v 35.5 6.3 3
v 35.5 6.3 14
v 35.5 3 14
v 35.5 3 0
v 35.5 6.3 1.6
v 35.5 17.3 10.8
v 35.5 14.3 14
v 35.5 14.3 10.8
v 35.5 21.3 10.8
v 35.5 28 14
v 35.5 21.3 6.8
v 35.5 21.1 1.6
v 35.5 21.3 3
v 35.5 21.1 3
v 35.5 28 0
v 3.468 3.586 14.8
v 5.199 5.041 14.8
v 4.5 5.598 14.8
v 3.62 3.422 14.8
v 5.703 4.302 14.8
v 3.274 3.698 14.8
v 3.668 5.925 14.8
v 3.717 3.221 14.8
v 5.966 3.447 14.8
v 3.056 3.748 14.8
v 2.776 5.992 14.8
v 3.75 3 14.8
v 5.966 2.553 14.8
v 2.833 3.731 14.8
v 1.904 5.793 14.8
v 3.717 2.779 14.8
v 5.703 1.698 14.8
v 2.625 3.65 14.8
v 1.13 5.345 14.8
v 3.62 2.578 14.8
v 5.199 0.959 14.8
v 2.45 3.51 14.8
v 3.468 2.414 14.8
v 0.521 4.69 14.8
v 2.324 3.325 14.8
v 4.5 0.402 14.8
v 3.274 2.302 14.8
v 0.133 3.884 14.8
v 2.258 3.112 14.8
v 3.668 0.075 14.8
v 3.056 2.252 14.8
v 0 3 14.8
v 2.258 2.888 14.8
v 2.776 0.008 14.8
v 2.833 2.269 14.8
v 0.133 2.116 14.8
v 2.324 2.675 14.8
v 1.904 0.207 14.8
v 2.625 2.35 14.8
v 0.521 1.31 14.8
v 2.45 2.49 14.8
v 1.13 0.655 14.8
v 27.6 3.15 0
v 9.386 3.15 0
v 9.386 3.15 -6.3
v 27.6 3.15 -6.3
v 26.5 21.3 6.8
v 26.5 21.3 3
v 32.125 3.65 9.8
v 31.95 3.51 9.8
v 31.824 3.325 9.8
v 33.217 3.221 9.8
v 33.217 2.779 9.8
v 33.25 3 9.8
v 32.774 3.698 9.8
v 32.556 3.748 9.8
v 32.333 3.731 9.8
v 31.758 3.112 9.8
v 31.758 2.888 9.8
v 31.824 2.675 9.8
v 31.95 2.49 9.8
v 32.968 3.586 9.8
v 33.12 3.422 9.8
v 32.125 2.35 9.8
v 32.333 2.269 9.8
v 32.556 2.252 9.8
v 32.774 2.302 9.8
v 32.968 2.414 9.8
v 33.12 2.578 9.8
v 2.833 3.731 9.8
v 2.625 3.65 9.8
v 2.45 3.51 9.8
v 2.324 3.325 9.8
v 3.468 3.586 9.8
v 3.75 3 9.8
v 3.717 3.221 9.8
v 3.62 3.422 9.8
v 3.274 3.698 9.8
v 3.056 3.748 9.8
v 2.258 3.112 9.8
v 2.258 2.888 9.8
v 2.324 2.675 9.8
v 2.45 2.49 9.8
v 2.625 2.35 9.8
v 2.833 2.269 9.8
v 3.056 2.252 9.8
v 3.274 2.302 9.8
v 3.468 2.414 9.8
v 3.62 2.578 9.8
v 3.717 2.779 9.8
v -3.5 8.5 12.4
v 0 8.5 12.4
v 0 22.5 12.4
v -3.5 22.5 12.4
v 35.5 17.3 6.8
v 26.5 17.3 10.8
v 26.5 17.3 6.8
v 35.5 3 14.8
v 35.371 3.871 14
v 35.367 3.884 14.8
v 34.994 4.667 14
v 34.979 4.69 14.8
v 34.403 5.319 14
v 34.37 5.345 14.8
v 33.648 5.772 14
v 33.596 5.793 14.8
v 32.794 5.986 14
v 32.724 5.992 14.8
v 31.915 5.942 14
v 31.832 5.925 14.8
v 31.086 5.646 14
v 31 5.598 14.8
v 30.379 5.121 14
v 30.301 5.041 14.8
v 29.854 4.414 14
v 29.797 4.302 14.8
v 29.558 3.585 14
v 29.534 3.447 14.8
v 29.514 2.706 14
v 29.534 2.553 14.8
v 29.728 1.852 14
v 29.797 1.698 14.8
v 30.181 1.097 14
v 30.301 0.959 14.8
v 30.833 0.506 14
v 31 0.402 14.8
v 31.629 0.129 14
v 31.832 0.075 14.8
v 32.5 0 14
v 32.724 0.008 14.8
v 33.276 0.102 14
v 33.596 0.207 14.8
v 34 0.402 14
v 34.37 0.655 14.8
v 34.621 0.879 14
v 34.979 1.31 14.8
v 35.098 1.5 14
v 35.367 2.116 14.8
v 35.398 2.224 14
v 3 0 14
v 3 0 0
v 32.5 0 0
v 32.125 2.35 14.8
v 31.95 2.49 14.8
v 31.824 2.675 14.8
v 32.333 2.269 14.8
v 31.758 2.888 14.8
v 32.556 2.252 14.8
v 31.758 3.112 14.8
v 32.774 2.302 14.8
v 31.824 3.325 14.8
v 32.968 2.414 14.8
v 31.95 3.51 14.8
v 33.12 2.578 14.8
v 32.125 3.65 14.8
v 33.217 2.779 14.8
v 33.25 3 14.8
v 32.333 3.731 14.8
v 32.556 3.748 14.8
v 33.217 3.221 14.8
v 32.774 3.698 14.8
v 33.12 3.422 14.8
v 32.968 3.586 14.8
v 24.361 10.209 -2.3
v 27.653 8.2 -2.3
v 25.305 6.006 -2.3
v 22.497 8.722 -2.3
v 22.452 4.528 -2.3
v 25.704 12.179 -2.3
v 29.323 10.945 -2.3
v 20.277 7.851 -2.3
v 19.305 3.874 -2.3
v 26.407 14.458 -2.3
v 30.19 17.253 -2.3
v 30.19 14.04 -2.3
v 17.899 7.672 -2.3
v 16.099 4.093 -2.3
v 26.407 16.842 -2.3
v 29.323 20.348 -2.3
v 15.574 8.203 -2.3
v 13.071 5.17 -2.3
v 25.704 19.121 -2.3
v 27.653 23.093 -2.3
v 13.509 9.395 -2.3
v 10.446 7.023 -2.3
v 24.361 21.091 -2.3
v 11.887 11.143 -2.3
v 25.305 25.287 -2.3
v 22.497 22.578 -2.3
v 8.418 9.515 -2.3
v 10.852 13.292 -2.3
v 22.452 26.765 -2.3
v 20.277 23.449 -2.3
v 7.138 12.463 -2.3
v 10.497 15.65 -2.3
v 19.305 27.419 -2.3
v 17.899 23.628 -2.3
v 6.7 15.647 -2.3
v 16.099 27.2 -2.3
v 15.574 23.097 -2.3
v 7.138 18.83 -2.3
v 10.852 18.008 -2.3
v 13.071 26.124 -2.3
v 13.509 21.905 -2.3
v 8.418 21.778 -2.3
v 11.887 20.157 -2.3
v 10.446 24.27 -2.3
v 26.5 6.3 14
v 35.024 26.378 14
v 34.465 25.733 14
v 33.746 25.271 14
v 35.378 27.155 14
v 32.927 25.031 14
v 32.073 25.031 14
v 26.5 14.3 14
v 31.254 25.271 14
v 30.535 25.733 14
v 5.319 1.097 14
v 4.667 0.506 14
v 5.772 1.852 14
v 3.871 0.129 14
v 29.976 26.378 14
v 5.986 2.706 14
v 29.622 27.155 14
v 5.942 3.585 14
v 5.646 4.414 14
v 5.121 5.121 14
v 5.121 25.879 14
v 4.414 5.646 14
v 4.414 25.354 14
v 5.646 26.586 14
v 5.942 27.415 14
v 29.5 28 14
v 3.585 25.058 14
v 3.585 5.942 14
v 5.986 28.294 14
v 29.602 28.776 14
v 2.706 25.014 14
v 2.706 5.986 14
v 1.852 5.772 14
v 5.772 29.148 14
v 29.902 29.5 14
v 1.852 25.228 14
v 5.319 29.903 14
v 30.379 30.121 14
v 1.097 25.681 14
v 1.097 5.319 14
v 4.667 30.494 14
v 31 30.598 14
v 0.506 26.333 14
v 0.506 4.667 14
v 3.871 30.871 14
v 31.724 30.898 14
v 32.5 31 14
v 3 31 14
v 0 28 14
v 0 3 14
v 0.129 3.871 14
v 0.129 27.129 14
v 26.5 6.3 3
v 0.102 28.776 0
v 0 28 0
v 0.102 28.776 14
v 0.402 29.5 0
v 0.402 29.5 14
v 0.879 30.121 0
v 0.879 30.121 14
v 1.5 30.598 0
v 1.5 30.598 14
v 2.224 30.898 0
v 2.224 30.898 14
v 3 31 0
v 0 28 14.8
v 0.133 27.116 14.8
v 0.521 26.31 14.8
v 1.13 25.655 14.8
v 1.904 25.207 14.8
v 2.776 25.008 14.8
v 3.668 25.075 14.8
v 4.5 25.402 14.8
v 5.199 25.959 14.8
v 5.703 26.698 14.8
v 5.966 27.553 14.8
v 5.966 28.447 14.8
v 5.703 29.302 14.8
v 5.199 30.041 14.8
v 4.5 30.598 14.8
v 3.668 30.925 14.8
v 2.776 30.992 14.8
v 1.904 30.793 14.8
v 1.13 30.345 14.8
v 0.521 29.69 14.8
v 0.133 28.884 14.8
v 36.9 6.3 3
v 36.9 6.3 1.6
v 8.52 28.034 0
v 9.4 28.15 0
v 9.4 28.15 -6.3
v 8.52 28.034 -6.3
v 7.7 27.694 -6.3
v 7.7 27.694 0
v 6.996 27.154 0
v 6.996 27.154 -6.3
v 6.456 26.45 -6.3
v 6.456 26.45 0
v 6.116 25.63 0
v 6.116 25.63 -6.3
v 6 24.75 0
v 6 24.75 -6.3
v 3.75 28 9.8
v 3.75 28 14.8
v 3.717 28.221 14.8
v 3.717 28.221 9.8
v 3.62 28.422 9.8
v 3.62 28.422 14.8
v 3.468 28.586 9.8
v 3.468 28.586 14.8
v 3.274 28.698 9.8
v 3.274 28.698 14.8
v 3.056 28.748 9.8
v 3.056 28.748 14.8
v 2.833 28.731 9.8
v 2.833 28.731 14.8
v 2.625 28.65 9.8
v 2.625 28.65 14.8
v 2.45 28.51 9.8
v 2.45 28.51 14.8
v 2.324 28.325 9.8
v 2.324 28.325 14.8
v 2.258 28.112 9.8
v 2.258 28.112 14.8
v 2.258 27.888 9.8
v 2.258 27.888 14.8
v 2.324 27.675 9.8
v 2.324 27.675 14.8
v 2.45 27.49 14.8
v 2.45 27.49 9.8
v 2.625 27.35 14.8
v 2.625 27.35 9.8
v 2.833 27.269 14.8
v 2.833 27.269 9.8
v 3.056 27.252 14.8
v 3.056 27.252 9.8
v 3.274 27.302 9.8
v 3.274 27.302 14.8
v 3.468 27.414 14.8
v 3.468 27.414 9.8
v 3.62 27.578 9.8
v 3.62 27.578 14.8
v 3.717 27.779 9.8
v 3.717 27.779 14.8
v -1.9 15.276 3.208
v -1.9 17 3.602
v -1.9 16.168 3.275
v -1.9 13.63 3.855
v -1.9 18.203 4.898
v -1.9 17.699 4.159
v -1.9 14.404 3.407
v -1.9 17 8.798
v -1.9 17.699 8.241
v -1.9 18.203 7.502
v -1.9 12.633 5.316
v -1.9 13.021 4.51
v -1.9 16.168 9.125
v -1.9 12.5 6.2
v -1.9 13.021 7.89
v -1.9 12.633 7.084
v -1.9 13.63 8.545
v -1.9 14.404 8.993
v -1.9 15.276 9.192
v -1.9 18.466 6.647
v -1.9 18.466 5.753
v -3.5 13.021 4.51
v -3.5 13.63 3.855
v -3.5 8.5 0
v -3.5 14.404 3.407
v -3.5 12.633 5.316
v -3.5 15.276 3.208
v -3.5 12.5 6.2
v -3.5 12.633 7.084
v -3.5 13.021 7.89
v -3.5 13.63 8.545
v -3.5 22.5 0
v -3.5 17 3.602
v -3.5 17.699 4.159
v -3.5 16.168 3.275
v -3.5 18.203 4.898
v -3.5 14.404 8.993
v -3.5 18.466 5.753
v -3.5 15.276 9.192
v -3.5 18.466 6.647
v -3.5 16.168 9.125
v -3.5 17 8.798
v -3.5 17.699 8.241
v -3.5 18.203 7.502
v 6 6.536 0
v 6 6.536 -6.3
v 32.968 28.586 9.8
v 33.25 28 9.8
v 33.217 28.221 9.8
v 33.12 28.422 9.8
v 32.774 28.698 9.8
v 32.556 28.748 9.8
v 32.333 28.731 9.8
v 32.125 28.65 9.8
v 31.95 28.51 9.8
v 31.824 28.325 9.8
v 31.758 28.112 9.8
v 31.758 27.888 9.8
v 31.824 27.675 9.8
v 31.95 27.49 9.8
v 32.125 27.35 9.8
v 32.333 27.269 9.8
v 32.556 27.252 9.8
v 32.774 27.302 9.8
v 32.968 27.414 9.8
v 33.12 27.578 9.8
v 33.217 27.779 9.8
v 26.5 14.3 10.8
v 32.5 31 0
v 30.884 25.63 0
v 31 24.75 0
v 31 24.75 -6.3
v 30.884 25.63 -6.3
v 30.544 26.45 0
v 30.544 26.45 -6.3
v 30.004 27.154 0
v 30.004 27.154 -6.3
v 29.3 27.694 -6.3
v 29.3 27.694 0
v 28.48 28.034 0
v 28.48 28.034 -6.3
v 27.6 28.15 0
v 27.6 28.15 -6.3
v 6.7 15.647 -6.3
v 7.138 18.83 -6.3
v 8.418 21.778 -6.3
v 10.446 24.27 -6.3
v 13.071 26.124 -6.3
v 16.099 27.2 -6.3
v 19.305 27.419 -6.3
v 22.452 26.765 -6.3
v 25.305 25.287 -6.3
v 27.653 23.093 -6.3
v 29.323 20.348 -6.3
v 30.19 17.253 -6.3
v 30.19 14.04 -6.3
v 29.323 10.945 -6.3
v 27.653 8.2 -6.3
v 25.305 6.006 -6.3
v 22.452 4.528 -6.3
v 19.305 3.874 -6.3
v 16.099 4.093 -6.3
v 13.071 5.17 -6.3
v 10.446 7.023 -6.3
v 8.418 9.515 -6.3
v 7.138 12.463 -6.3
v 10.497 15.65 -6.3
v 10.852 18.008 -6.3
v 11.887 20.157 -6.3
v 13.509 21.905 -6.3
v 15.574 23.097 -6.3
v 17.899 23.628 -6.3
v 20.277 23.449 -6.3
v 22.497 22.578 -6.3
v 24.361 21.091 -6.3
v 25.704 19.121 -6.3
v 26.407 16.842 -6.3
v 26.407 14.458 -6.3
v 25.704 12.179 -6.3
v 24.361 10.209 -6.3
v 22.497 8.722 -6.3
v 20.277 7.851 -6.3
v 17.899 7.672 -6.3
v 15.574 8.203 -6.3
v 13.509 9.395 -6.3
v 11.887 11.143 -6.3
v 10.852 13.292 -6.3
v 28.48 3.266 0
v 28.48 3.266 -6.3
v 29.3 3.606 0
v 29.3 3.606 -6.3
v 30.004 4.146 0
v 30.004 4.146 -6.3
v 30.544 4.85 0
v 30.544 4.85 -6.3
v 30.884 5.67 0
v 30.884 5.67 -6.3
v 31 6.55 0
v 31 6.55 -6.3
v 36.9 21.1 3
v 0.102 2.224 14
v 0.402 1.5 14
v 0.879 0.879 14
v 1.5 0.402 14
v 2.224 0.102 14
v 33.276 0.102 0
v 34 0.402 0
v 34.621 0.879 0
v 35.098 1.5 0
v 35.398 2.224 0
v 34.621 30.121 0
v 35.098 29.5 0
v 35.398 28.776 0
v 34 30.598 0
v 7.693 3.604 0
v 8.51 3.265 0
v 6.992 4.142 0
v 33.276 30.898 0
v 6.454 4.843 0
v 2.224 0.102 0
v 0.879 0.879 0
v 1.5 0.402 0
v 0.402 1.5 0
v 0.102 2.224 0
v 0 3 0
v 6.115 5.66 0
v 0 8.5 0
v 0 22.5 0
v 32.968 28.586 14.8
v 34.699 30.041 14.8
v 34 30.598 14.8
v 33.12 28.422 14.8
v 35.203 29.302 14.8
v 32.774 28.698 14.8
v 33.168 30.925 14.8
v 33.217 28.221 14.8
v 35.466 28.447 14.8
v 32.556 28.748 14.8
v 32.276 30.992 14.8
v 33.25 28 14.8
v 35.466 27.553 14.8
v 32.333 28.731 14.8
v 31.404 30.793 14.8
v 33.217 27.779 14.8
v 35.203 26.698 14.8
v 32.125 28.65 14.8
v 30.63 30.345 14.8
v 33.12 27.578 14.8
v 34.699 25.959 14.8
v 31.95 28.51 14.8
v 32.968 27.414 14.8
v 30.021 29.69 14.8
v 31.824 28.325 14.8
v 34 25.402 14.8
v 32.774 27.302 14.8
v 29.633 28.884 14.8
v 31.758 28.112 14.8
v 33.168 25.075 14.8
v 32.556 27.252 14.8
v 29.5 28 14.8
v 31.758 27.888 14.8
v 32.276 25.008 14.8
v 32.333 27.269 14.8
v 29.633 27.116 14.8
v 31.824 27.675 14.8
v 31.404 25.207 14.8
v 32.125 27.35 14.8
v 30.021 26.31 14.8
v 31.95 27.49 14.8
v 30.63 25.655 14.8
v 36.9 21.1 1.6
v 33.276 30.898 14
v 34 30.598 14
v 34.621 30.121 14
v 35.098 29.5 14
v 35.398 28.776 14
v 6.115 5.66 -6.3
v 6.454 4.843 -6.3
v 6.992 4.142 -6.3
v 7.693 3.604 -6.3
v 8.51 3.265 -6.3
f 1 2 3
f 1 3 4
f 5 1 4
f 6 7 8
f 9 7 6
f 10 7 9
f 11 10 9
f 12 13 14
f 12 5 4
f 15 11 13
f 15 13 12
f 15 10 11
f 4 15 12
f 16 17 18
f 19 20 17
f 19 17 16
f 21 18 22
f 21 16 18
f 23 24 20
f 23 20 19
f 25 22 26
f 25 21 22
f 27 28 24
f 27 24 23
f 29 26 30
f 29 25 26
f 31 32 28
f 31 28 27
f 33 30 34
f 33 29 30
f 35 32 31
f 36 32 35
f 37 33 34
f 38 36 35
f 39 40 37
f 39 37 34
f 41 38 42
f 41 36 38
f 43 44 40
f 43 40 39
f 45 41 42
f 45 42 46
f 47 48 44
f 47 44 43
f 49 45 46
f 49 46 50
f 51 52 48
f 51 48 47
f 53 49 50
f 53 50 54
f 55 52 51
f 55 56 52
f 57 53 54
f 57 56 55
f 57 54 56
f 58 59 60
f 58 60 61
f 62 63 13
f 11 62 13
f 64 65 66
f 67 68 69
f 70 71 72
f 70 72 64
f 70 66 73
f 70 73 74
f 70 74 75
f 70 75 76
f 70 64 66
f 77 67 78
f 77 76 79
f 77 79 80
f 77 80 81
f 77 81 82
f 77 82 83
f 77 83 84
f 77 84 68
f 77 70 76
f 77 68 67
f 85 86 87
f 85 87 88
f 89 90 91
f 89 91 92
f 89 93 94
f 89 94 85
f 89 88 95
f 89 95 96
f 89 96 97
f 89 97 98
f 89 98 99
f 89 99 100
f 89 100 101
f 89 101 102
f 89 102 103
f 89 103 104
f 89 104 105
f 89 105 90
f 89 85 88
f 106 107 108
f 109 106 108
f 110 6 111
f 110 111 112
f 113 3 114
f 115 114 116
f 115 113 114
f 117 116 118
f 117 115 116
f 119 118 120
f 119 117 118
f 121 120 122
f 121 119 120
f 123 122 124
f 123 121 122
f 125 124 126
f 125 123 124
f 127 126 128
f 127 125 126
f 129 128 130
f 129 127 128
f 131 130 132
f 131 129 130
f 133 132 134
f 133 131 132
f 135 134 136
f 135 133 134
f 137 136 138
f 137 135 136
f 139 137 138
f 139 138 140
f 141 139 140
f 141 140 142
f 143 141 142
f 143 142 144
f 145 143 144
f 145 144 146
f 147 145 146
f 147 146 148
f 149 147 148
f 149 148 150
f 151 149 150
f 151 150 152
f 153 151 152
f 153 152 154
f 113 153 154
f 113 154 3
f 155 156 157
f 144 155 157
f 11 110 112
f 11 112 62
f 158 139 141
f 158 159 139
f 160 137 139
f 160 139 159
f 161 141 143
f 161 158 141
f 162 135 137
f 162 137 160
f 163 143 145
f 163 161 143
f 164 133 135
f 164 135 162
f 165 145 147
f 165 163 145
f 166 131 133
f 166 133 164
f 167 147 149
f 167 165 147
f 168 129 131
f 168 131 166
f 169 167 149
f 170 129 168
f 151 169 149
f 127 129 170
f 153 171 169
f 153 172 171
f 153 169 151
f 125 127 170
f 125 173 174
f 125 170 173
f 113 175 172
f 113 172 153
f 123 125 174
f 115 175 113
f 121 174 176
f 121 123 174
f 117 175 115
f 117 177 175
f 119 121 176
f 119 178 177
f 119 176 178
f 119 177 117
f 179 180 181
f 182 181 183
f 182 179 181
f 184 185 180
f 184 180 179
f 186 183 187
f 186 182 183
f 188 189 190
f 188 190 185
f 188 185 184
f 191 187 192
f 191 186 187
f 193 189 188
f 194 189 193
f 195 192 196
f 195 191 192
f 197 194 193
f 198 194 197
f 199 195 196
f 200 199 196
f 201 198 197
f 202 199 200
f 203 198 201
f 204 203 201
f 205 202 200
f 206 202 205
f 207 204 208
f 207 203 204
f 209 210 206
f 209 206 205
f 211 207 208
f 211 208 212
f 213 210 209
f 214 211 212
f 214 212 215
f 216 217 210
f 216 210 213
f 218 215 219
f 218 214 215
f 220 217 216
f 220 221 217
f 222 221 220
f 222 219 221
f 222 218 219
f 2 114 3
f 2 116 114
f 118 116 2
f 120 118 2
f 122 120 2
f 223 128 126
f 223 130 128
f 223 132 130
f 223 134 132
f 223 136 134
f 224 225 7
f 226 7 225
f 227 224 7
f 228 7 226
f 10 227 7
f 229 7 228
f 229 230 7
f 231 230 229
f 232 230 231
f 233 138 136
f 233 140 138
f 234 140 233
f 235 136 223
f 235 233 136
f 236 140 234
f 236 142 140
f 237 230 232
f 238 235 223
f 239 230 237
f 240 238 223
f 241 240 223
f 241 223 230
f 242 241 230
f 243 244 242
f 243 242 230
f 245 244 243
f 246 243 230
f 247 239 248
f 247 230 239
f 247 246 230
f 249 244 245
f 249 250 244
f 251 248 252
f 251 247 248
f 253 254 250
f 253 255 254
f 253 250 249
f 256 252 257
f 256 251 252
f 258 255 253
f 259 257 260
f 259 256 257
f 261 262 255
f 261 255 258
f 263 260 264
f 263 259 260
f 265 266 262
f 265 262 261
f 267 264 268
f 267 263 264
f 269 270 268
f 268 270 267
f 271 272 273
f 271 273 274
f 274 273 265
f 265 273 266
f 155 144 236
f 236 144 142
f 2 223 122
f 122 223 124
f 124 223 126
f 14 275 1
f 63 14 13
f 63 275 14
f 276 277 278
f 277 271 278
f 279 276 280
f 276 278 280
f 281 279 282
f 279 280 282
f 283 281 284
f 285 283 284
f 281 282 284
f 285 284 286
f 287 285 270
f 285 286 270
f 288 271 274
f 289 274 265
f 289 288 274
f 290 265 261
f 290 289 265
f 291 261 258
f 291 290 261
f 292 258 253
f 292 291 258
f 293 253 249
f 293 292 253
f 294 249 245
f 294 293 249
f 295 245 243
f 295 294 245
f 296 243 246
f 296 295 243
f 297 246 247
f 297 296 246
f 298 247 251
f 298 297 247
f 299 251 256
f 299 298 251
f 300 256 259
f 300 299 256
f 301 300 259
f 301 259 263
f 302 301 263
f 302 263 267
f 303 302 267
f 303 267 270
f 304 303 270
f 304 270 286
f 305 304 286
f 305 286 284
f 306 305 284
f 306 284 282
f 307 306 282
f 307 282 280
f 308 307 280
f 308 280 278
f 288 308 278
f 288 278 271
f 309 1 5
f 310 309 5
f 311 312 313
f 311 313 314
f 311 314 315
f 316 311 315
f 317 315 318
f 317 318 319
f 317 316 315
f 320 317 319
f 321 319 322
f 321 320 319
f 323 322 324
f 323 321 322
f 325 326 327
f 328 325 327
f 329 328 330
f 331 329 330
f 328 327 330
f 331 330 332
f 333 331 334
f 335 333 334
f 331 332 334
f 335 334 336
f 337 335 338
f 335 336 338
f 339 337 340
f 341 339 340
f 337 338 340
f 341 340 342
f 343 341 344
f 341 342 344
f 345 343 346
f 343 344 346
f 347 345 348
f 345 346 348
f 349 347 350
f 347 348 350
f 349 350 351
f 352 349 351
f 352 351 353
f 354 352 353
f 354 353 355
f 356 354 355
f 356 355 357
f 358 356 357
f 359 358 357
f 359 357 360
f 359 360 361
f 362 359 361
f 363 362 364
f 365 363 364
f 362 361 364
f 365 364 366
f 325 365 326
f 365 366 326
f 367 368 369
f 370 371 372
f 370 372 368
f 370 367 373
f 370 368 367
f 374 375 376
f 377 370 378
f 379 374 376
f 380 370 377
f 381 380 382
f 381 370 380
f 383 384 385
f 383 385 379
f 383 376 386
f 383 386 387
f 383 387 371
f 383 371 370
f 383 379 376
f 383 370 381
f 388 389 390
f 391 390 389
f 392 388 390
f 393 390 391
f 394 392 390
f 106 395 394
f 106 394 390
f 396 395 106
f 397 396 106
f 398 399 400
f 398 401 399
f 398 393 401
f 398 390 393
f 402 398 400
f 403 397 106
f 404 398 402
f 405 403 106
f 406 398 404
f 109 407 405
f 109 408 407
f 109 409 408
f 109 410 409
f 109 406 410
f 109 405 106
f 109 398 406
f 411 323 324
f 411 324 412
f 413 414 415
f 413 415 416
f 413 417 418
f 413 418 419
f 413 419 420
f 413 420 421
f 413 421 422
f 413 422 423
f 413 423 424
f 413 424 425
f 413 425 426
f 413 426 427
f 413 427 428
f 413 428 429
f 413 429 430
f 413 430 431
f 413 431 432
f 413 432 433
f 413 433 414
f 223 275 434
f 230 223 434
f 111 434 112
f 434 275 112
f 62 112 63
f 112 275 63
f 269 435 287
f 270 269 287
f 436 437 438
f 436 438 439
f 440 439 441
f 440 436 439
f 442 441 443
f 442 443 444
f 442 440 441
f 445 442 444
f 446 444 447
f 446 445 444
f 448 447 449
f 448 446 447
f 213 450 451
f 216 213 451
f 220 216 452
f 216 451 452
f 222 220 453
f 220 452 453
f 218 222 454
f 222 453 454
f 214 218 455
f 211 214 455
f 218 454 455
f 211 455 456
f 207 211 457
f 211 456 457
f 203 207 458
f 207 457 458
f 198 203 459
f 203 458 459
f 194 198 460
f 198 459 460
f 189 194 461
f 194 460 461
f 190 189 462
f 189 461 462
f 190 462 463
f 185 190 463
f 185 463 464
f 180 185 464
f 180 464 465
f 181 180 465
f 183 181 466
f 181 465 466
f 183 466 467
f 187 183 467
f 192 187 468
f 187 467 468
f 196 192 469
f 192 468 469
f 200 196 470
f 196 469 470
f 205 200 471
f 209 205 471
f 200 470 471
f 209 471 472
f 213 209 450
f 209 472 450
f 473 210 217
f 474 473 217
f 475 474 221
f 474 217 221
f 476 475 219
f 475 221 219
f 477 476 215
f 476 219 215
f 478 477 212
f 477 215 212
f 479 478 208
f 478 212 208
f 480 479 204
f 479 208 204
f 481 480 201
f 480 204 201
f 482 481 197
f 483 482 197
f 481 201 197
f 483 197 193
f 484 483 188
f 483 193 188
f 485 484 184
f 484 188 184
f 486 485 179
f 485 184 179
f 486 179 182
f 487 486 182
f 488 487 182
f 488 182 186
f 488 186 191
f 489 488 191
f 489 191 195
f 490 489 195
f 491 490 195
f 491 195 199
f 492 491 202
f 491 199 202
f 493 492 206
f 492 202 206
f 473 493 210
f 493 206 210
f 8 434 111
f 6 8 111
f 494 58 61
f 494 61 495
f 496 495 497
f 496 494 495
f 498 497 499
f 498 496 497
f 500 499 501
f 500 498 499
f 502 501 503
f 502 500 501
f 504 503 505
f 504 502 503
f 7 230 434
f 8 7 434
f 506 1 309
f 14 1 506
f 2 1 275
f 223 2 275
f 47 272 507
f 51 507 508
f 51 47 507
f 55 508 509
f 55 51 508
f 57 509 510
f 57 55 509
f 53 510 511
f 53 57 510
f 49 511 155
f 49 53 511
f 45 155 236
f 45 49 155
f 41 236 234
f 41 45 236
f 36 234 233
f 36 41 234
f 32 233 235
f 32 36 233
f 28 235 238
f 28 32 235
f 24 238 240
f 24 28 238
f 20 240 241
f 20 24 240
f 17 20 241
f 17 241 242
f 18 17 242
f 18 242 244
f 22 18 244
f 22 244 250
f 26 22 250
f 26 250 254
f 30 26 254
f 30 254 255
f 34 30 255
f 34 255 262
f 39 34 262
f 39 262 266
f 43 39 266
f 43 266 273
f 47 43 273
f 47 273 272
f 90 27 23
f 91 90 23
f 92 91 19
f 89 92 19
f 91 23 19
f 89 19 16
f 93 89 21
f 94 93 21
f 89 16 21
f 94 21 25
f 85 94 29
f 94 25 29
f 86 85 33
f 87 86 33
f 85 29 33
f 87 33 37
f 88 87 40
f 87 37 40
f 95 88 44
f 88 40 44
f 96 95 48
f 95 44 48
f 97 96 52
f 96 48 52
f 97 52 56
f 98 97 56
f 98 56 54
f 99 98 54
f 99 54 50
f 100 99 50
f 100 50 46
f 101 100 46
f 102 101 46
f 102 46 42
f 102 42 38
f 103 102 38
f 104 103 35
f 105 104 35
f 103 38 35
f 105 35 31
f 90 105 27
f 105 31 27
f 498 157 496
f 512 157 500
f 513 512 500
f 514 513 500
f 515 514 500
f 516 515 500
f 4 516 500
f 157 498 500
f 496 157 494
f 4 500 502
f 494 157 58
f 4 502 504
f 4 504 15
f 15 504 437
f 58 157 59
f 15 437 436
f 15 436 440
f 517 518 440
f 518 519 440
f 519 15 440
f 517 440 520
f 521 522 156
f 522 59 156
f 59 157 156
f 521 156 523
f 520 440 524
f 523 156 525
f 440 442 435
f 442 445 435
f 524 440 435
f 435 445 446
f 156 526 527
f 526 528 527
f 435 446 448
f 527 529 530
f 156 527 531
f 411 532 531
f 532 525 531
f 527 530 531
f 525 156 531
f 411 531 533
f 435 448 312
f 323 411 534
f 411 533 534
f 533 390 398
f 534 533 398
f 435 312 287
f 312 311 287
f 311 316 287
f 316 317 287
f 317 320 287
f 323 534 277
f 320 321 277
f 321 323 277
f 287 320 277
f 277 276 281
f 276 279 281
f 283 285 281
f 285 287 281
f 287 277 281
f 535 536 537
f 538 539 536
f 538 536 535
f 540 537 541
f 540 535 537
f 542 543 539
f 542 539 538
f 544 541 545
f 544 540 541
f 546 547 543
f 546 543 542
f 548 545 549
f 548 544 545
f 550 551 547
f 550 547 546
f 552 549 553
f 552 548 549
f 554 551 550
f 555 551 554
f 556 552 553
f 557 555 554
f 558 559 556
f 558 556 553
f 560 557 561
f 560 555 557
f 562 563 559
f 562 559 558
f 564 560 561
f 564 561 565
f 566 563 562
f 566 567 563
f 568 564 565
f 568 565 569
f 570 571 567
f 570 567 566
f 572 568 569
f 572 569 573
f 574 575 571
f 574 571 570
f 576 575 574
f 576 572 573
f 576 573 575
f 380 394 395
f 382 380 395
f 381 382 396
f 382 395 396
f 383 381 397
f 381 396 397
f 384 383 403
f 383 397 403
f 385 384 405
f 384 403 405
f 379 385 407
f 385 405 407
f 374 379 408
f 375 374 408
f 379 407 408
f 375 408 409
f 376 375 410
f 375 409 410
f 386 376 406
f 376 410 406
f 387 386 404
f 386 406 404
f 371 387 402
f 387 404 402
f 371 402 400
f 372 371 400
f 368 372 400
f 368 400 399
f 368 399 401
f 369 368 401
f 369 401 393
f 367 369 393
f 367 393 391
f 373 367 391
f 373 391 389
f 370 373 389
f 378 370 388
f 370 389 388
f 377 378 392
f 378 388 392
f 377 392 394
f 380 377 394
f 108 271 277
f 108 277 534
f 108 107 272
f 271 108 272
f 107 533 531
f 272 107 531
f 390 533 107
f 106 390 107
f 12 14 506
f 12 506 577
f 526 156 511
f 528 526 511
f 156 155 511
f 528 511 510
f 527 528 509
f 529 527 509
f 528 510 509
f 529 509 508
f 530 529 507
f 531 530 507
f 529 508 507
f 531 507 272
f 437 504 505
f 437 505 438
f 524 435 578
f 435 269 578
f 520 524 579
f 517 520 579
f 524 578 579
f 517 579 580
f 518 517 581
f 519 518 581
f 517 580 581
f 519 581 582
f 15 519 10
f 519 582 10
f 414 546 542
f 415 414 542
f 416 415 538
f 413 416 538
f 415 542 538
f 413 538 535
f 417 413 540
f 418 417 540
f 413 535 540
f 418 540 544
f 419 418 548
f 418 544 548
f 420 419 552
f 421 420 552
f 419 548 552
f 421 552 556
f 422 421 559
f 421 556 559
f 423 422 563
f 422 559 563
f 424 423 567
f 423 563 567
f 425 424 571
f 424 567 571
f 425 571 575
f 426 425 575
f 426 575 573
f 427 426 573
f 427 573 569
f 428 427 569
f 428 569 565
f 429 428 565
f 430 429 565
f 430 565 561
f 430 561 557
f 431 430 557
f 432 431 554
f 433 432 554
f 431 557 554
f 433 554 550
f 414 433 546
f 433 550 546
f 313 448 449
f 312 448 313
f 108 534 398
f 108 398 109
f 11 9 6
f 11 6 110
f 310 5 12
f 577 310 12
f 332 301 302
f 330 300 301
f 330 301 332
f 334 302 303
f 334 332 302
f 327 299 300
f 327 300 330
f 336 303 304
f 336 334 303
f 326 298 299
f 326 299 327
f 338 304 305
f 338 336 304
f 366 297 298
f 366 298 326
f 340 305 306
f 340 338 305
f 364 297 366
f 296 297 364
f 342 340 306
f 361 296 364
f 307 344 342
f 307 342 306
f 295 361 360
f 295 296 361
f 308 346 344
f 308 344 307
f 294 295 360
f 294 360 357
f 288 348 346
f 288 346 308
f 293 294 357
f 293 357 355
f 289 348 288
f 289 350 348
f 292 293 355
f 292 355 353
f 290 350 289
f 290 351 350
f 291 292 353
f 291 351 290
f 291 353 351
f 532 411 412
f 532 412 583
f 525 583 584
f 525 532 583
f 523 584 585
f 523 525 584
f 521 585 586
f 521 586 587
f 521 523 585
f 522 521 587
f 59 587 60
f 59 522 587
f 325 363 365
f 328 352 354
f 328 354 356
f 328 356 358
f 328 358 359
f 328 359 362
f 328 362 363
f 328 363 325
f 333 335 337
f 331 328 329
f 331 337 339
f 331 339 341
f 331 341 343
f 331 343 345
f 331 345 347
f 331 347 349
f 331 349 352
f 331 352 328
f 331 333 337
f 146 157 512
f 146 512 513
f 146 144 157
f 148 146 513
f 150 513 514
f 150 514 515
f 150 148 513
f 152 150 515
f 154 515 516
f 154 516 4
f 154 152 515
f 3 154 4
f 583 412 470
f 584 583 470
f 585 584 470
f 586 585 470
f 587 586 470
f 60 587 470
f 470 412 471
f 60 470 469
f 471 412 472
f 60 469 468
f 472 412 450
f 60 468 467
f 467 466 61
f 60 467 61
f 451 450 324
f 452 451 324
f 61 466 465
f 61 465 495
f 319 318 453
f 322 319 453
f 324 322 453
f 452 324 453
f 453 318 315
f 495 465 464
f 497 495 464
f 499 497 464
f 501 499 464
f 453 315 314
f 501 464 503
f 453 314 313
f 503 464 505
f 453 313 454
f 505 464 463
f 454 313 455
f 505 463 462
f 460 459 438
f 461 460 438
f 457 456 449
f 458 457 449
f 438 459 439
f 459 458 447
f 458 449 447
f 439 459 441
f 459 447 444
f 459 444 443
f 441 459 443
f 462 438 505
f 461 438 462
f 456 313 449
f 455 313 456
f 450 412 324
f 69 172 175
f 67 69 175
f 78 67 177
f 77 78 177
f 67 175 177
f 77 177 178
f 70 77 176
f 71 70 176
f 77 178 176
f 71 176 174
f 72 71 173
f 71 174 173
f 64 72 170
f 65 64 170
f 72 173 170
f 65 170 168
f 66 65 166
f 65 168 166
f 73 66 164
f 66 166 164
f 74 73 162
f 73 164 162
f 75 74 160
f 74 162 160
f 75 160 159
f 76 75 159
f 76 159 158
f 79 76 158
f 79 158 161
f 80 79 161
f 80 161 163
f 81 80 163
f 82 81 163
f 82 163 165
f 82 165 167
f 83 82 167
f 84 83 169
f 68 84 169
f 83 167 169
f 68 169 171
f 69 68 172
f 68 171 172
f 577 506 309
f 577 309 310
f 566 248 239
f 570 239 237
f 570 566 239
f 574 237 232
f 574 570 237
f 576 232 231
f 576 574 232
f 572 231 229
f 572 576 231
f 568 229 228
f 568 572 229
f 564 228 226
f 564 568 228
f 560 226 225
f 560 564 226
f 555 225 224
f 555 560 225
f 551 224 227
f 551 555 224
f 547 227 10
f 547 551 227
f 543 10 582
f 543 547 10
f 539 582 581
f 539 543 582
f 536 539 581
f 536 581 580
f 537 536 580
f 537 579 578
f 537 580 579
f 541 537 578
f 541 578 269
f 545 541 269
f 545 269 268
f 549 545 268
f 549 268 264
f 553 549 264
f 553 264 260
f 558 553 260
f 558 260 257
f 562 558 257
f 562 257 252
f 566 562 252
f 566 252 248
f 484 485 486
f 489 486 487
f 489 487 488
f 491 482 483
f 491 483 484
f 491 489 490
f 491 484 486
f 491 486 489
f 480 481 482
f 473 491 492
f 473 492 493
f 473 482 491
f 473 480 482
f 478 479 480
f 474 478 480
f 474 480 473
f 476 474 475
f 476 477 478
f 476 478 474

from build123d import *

# Parameters (mm, degrees)
BOSS_EXTRUDE1_DEPTH  = 14
BOSS_EXTRUDE5_DEPTH  = 3.5
SKETCH11_R           = 2.9999999999999982
BOSS_EXTRUDE6_DEPTH  = 1.5
SKETCH11_2_R         = 2.9999999999999982
CUT_EXTRUDE1_DEPTH   = 1.6
BOSS_EXTRUDE7_DEPTH  = 9
BOSS_EXTRUDE8_DEPTH  = 9
FILLET1_R            = 3
BOSS_EXTRUDE10_START = 0.8
SKETCH15_R           = 3.0000000000000013
SKETCH15_R_2         = 3
SKETCH15_R_3         = 3.0000000000000004
SKETCH15_R_4         = 3.0000000000000018
BOSS_EXTRUDE10_DEPTH = 0.8
SKETCH16_R           = 0.7500000000000009
SKETCH16_R_2         = 0.7500000000000007
SKETCH16_R_3         = 0.7499999999999986
SKETCH16_R_4         = 0.7499999999999987
CUT_EXTRUDE2_DEPTH   = 5
SKETCH17_W           = 3.999999999999999
SKETCH17_H           = 4
BOSS_EXTRUDE11_DEPTH = 9
BOSS_EXTRUDE12_DEPTH = 6.3
SKETCH19_R           = 11.800000000000002
CUT_EXTRUDE3_DEPTH   = 4
SKETCH20_R           = 8.000000000000002
BOSS_EXTRUDE13_DEPTH = 4
BOSS_EXTRUDE14_DEPTH = 1.4


with BuildPart() as part:
    # Sketch1 → Boss-Extrude1 (new body)
    with BuildSketch(Plane.XY):
        Polygon((0, 0), (35.5, 0), (35.5, 6.3), (26.499999999999996, 6.3), (26.499999999999996, 21.3), (35.5, 21.3), (35.5, 31.000000000000004), (-3.83e-15, 31.000000000000004), align=None)
    extrude(amount=BOSS_EXTRUDE1_DEPTH)

    # Sketch10 → Boss-Extrude5 (add)
    with BuildSketch(Plane.ZY):
        Polygon((0, 22.500000000000004), (12.4, 22.500000000000004), (12.4, 8.500000000000002), (1.71e-15, 8.500000000000002), align=None)
    extrude(amount=BOSS_EXTRUDE5_DEPTH)

    # Sketch11 → Boss-Extrude6 (add)
    with BuildSketch(Plane.ZY.offset(3.5)):
        with Locations((6.200000000000002, 15.500000000000004)):
            Circle(SKETCH11_R)
    extrude(amount=-BOSS_EXTRUDE6_DEPTH)

    # Sketch11<2> → Cut-Extrude1 (cut)
    with BuildSketch(Plane.ZY.offset(3.5)):
        with Locations((6.200000000000002, 15.500000000000004)):
            Circle(SKETCH11_2_R)
    extrude(amount=-CUT_EXTRUDE1_DEPTH, mode=Mode.SUBTRACT)

    # Sketch12 → Boss-Extrude7 (add)
    with BuildSketch(Plane(origin=(26.499999999999996, 0, 0), x_dir=(0, 0, -1), z_dir=(1, 0, 0))):
        Polygon((0, 21.3), (-3, 21.3), (-2.999999999999999, 6.299999999999998), (-6.6e-16, 6.299999999999998), align=None)
    extrude(amount=BOSS_EXTRUDE7_DEPTH)

    # Sketch13 → Boss-Extrude8 (add)
    with BuildSketch(Plane(origin=(26.499999999999996, 0, 0), x_dir=(0, 0, -1), z_dir=(1, 0, 0))):
        Polygon((-14, 21.3), (-10.800000000000002, 21.3), (-10.800000000000002, 14.300000000000002), (-14.000000000000002, 14.3), align=None)
    extrude(amount=BOSS_EXTRUDE8_DEPTH)

    # Fillet1
    fillet1_edges = [part.edges().sort_by_distance(p)[0] for p in [
        (0, 0, 7),
        (35.5, 0, 7),
        (35.5, 31.000000000000004, 7),
        (-3.83e-15, 31.000000000000004, 7),
    ]]
    fillet(fillet1_edges, radius=FILLET1_R)

    # Sketch15 → Boss-Extrude10 (add)
    with BuildSketch(Plane.XY.offset(14).offset(BOSS_EXTRUDE10_START)):
        with Locations((32.49999999999999, 2.999999999999999)):
            Circle(SKETCH15_R)
        with Locations((2.999999999999999, 3)):
            Circle(SKETCH15_R_2)
        with Locations((2.9999999999999964, 28.000000000000004)):
            Circle(SKETCH15_R_3)
        with Locations((32.49999999999999, 28.000000000000004)):
            Circle(SKETCH15_R_4)
    extrude(amount=-BOSS_EXTRUDE10_DEPTH)

    # Sketch16 → Cut-Extrude2 (cut)
    with BuildSketch(Plane.XY.offset(14.8)):
        with Locations((2.9999999999999964, 28.000000000000004)):
            Circle(SKETCH16_R)
        with Locations((2.999999999999999, 3)):
            Circle(SKETCH16_R_2)
        with Locations((32.49999999999999, 2.999999999999999)):
            Circle(SKETCH16_R_3)
        with Locations((32.49999999999999, 28.000000000000004)):
            Circle(SKETCH16_R_4)
    extrude(amount=-CUT_EXTRUDE2_DEPTH, mode=Mode.SUBTRACT)

    # Sketch17 → Boss-Extrude11 (add)
    with BuildSketch(Plane(origin=(26.499999999999996, 0, 0), x_dir=(0, 0, -1), z_dir=(1, 0, 0))):
        with Locations((-8.800000000000002, 19.3)):
            Rectangle(SKETCH17_W, SKETCH17_H)
    extrude(amount=BOSS_EXTRUDE11_DEPTH)

    # Sketch18 → Boss-Extrude12 (add)
    with BuildSketch(Plane(origin=(0, 0, 0), x_dir=(-1, 0, 0), z_dir=(0, 0, -1))):
        with BuildLine():
            Line((-9.386280913258961, 3.15), (-27.599999999999998, 3.1499999999999964))
            ThreePointArc((-27.599999999999998, 3.1499999999999964), (-30.00416305603426, 4.145836943965737), (-30.999999999999996, 6.549999999999997))
            Line((-30.999999999999996, 6.549999999999997), (-30.999999999999993, 24.749999999999996))
            ThreePointArc((-30.999999999999993, 24.749999999999996), (-30.00416305603426, 27.154163056034264), (-27.599999999999994, 28.150000000000002))
            Line((-27.599999999999994, 28.150000000000002), (-9.399999999999995, 28.150000000000002))
            ThreePointArc((-9.399999999999995, 28.150000000000002), (-6.995836943965732, 27.154163056034264), (-5.999999999999993, 24.75))
            Line((-5.999999999999993, 24.75), (-5.999999999999993, 6.53628091325897))
            ThreePointArc((-5.999999999999993, 6.53628091325897), (-6.991818716490969, 4.141818716490977), (-9.386280913258961, 3.15))
        make_face()
    extrude(amount=BOSS_EXTRUDE12_DEPTH)

    # Sketch19 → Cut-Extrude3 (cut)
    with BuildSketch(Plane(origin=(0, 0, -6.3), x_dir=(-1, 0, 0), z_dir=(0, 0, -1))):
        with Locations((-18.499999999999993, 15.64657022831474)):
            Circle(SKETCH19_R)
    extrude(amount=-CUT_EXTRUDE3_DEPTH, mode=Mode.SUBTRACT)

    # Sketch20 → Boss-Extrude13 (add)
    with BuildSketch(Plane(origin=(0, 0, -2.3), x_dir=(-1, 0, 0), z_dir=(0, 0, -1))):
        with Locations((-18.496570228314738, 15.649999999999997)):
            Circle(SKETCH20_R)
    extrude(amount=BOSS_EXTRUDE13_DEPTH)

    # Sketch23 → Boss-Extrude14 (add)
    with BuildSketch(Plane(origin=(35.5, 0, 0), x_dir=(0, 0, -1), z_dir=(1, 0, 0))):
        Polygon((-1.600000000000001, 21.1), (-3.000000000000001, 21.1), (-2.999999999999999, 6.300000000000002), (-1.5999999999999992, 6.300000000000002), align=None)
    extrude(amount=BOSS_EXTRUDE14_DEPTH)


solid = part.part
